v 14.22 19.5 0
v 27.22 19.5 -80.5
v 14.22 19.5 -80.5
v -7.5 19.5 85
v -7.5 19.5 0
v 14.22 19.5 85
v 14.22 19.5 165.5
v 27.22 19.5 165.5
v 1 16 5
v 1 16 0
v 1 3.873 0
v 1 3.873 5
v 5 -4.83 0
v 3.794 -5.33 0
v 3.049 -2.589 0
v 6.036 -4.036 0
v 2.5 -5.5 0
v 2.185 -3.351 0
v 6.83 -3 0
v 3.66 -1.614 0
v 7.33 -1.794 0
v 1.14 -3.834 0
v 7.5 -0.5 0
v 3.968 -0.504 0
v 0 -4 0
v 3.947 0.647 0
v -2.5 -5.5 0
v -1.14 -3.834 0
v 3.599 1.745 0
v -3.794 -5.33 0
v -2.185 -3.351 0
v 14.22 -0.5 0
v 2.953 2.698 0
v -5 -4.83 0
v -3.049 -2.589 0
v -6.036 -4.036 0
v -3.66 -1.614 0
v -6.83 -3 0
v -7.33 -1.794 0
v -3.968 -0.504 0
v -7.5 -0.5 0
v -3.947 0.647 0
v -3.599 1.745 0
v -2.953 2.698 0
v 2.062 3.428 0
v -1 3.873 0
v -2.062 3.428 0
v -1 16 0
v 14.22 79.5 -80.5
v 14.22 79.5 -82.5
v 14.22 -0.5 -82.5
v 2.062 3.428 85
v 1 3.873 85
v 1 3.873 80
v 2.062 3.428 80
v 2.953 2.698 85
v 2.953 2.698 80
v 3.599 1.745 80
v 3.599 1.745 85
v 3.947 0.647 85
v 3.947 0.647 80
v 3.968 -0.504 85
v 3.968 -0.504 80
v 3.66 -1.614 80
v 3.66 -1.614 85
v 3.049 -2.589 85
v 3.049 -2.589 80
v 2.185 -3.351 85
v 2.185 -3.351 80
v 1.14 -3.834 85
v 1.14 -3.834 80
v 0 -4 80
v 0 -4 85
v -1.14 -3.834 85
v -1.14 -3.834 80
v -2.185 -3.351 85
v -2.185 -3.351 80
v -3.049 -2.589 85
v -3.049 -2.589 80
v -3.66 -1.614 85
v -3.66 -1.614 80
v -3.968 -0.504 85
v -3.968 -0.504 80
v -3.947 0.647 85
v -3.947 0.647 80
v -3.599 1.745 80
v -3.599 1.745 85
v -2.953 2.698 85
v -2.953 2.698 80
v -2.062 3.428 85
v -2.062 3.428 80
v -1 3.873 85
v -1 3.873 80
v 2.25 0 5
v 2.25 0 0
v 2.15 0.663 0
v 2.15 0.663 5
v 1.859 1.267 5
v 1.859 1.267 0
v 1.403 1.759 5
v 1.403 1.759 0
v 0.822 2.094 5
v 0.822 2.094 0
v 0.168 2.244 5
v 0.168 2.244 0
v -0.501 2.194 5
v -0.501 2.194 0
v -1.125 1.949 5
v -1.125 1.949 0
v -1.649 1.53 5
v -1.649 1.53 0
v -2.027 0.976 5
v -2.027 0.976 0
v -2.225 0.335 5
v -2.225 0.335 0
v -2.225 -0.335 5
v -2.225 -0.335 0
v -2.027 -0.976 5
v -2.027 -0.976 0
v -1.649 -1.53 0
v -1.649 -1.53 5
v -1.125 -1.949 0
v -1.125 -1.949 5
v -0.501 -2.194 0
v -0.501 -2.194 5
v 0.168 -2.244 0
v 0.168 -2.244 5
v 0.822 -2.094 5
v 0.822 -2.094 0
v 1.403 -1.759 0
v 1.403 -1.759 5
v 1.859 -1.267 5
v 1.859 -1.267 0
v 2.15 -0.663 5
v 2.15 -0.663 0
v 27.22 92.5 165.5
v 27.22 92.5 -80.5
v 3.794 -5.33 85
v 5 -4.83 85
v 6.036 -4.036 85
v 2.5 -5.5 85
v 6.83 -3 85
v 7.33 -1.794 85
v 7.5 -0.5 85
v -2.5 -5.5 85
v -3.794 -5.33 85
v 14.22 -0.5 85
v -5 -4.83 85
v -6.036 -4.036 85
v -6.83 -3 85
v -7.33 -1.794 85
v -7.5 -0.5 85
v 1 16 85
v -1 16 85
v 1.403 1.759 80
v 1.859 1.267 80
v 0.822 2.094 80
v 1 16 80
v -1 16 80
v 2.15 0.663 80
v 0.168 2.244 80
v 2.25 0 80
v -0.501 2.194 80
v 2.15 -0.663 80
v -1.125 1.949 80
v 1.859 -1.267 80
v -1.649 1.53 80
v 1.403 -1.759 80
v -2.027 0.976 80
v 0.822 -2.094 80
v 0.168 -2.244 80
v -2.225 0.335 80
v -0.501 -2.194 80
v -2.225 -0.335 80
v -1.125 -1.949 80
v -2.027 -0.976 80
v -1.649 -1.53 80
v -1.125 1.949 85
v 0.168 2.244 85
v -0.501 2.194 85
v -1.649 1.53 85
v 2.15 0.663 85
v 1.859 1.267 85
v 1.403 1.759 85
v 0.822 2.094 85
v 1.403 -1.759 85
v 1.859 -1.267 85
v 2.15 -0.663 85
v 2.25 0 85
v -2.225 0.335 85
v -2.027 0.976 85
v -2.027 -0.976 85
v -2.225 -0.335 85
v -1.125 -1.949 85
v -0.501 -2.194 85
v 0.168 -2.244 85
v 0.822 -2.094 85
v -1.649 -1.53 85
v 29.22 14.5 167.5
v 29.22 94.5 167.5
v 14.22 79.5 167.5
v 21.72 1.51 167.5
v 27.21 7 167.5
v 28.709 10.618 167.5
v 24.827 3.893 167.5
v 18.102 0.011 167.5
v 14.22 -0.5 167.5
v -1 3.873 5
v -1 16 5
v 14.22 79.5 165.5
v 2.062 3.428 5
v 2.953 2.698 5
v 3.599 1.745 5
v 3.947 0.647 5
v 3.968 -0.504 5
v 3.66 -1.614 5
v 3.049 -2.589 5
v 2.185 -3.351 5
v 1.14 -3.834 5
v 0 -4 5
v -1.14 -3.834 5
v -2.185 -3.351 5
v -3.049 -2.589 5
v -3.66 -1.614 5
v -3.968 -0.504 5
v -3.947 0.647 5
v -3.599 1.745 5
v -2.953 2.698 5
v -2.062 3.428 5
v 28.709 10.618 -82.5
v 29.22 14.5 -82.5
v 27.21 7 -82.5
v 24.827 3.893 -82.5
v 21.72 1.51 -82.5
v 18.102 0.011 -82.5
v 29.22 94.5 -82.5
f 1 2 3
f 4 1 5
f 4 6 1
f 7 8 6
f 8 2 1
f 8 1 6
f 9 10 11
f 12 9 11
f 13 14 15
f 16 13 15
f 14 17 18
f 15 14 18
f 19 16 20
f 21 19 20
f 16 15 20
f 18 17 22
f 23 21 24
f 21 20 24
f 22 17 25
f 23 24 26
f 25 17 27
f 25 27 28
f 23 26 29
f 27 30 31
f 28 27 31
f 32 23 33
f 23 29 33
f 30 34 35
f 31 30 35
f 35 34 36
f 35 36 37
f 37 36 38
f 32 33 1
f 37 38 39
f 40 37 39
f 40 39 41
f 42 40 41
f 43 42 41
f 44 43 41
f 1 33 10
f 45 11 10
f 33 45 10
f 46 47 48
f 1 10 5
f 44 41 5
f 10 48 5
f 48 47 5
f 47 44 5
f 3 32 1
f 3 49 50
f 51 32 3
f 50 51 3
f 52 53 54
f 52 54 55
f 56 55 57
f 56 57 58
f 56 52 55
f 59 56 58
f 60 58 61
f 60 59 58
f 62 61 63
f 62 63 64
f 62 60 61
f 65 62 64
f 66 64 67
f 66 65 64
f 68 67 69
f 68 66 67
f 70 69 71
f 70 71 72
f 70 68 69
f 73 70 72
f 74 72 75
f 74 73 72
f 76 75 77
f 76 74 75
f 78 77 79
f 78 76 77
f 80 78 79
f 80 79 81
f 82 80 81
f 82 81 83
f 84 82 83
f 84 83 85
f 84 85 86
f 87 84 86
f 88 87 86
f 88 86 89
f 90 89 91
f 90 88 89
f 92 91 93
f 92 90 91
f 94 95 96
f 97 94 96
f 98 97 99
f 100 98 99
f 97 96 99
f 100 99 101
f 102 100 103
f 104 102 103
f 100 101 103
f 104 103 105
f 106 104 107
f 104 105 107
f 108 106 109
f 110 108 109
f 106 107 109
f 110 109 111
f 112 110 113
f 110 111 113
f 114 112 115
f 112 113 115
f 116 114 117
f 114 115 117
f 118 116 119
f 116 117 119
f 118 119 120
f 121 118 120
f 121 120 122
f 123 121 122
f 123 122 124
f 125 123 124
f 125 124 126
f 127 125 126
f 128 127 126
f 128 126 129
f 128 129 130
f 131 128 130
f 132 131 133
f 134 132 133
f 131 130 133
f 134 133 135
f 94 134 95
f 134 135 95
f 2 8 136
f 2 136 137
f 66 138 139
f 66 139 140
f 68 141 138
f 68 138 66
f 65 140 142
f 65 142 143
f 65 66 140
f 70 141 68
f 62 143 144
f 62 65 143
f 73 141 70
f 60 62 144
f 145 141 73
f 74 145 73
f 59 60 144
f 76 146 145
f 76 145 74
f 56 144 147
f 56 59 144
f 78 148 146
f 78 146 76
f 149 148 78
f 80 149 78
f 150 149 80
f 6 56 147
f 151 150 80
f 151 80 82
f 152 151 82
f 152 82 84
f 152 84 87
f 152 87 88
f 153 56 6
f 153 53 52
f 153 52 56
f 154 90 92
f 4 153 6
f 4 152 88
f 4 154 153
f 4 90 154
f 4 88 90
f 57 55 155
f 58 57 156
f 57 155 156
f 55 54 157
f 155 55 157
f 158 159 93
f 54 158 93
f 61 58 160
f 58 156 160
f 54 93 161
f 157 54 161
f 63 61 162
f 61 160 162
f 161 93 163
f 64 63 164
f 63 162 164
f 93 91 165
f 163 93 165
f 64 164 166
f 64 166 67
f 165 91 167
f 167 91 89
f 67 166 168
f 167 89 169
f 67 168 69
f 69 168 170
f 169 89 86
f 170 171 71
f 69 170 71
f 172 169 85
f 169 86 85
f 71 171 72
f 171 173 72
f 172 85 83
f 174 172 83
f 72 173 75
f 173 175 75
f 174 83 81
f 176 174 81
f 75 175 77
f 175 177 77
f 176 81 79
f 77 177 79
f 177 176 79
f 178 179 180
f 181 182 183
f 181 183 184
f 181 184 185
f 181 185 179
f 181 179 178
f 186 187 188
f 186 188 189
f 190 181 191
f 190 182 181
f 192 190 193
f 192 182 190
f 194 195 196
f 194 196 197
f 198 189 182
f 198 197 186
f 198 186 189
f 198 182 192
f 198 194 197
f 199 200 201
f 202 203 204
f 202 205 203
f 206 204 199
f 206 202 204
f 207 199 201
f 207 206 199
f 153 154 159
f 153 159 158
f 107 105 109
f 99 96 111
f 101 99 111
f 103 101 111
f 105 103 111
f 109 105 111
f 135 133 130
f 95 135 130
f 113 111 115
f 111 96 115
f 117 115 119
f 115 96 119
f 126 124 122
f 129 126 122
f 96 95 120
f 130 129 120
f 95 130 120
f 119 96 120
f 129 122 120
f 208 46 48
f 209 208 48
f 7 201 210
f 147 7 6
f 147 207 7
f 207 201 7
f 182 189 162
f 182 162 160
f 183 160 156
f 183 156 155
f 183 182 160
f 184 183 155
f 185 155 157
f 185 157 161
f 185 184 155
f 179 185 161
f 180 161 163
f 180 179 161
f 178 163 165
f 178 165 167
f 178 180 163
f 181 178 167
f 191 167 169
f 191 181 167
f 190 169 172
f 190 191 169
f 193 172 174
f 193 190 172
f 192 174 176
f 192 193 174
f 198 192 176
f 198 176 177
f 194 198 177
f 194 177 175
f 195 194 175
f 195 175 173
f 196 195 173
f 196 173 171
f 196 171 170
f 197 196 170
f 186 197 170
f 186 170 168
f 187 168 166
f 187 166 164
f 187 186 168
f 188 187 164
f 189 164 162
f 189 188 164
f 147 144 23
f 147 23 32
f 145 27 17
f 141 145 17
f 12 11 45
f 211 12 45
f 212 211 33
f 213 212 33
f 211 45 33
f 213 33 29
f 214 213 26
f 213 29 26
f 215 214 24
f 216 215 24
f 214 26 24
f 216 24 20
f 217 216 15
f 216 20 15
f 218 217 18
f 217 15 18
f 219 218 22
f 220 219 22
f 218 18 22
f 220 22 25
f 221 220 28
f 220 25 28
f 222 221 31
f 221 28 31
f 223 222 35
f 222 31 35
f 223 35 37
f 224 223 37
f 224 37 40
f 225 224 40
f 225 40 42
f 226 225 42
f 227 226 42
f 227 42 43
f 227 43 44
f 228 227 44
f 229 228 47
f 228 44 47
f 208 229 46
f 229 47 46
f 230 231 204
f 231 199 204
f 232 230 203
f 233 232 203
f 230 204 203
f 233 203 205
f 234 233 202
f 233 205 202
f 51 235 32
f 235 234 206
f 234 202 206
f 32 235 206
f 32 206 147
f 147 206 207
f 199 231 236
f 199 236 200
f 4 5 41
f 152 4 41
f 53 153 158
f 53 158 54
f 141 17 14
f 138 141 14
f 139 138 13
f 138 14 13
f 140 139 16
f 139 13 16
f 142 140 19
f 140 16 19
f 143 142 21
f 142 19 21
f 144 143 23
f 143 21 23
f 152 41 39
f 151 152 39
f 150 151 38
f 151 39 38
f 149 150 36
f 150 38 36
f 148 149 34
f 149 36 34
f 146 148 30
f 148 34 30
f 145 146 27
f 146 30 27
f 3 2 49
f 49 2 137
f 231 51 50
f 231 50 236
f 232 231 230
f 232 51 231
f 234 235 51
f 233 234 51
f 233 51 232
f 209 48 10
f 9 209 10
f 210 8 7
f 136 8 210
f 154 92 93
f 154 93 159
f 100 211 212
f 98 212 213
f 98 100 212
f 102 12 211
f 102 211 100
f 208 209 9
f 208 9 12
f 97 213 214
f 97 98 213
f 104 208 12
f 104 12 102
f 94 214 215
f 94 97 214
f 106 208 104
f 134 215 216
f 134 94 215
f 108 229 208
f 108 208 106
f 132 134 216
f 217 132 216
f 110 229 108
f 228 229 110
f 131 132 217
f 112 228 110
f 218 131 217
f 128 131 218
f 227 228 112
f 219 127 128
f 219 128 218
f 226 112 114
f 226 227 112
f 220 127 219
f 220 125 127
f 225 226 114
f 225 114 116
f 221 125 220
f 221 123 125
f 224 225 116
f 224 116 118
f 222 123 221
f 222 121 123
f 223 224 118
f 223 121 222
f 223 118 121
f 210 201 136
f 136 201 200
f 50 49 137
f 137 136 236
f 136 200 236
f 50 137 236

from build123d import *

# Parameters (mm, degrees)
SKETCH2_R                = 2.25
BOSS_EXTRUDE2_DEPTH      = 5
BOSS_EXTRUDE3_DEPTH      = 85
SKETCH2_2_R              = 2.25
CUT_EXTRUDE1_DEPTH       = 5
SKETCH9_W                = 20
SKETCH9_H                = 85
BOSS_EXTRUDE6_DEPTH      = 21.72
BOSS_EXTRUDE7_DEPTH      = 75
BOSS_EXTRUDE7_DEPTH_BACK = 20
FILLET2_R                = 15
SKETCH12_W               = 40
SKETCH12_H               = 246
CUT_EXTRUDE2_DEPTH       = 75
CHAMFER2_SIZE            = 15


with BuildPart() as part:
    # Sketch2 → Boss-Extrude2 (new body)
    with BuildSketch(Plane(origin=(0, 0, 0), x_dir=(0, 1, 0), z_dir=(0, 0, 1))):
        with BuildLine():
            Line((3.872983346, 1), (16, 1))
            Line((16, 1), (16, -1))
            Line((16, -1), (3.872983346, -1))
            ThreePointArc((3.872983346, -1), (-4, 0), (3.872983346, 1))
        make_face()
        with Locations(Location((0, 0, 0), (0, 0, 270))):
            Circle(SKETCH2_R, mode=Mode.SUBTRACT)
    extrude(amount=BOSS_EXTRUDE2_DEPTH)

    # Sketch4 → Boss-Extrude3 (add)
    with BuildSketch(Plane(origin=(0, 0, 0), x_dir=(1, 0, 0), z_dir=(0, 0, -1))):
        with BuildLine():
            Line((-2.5, 5.5), (2.5, 5.5))
            ThreePointArc((2.5, 5.5), (6.035533906, 4.035533906), (7.5, 0.5))
            Line((7.5, 0.5), (7.5, -19.5))
            Line((7.5, -19.5), (-7.5, -19.5))
            Line((-7.5, -19.5), (-7.5, 0.5))
            ThreePointArc((-7.5, 0.5), (-6.035533906, 4.035533906), (-2.5, 5.5))
        make_face()
    extrude(amount=-BOSS_EXTRUDE3_DEPTH)

    # Sketch2<2> → Cut-Extrude1 (cut)
    with BuildSketch(Plane(origin=(0, 0, 0), x_dir=(0, 1, 0), z_dir=(0, 0, 1))):
        with BuildLine():
            Line((3.872983346, 1), (16, 1))
            Line((16, 1), (16, -1))
            Line((16, -1), (3.872983346, -1))
            ThreePointArc((3.872983346, -1), (-4, 0), (3.872983346, 1))
        make_face()
        with Locations(Location((0, 0, 0), (0, 0, 270))):
            Circle(SKETCH2_2_R, mode=Mode.SUBTRACT)
    cut_extrude1 = extrude(amount=CUT_EXTRUDE1_DEPTH, mode=Mode.SUBTRACT)

    # Mirror1: Cut-Extrude1 across plane
    add(cut_extrude1.mirror(Plane.XY.offset(42.5)), mode=Mode.SUBTRACT)

    # Sketch9 → Boss-Extrude6 (add)
    with BuildSketch(Plane.YZ.offset(7.5)):
        with Locations((9.5, 42.5)):
            Rectangle(SKETCH9_W, SKETCH9_H)
    extrude(amount=BOSS_EXTRUDE6_DEPTH)

    # Sketch11 → Boss-Extrude7 (add, two sides: drawn at the far end of the back side and taken through both)
    with BuildSketch(Plane(origin=(0, 19.5, 0), x_dir=(-1, 0, 0), z_dir=(0, 1, 0)).offset(-BOSS_EXTRUDE7_DEPTH_BACK)):
        Polygon((-27.22, 0), (-14.22, 0), (-14.22, -82.5), (-29.22, -82.5), (-29.22, 167.5), (-14.22, 167.5), (-14.22, 85), (-27.22, 85), align=None)
    extrude(amount=BOSS_EXTRUDE7_DEPTH + BOSS_EXTRUDE7_DEPTH_BACK)

    # Fillet2
    fillet2_edges = [part.edges().sort_by_distance(p)[0] for p in [
        (29.22, -0.5, 42.5),
    ]]
    fillet(fillet2_edges, radius=FILLET2_R)

    # Sketch12 → Cut-Extrude2 (cut)
    with BuildSketch(Plane(origin=(0, 94.5, 0), x_dir=(-1, 0, 0), z_dir=(0, 1, 0))):
        with Locations((-7.22, 42.5)):
            Rectangle(SKETCH12_W, SKETCH12_H)
    extrude(amount=-CUT_EXTRUDE2_DEPTH, mode=Mode.SUBTRACT)

    # Chamfer2
    chamfer2_edges = [part.edges().sort_by_distance(p)[0] for p in [
        (14.22, 94.5, 166.5),
    ]]
    chamfer(chamfer2_edges, length=CHAMFER2_SIZE - 0.0001)  # a hair under: the kernel refuses the full size


solid = part.part
